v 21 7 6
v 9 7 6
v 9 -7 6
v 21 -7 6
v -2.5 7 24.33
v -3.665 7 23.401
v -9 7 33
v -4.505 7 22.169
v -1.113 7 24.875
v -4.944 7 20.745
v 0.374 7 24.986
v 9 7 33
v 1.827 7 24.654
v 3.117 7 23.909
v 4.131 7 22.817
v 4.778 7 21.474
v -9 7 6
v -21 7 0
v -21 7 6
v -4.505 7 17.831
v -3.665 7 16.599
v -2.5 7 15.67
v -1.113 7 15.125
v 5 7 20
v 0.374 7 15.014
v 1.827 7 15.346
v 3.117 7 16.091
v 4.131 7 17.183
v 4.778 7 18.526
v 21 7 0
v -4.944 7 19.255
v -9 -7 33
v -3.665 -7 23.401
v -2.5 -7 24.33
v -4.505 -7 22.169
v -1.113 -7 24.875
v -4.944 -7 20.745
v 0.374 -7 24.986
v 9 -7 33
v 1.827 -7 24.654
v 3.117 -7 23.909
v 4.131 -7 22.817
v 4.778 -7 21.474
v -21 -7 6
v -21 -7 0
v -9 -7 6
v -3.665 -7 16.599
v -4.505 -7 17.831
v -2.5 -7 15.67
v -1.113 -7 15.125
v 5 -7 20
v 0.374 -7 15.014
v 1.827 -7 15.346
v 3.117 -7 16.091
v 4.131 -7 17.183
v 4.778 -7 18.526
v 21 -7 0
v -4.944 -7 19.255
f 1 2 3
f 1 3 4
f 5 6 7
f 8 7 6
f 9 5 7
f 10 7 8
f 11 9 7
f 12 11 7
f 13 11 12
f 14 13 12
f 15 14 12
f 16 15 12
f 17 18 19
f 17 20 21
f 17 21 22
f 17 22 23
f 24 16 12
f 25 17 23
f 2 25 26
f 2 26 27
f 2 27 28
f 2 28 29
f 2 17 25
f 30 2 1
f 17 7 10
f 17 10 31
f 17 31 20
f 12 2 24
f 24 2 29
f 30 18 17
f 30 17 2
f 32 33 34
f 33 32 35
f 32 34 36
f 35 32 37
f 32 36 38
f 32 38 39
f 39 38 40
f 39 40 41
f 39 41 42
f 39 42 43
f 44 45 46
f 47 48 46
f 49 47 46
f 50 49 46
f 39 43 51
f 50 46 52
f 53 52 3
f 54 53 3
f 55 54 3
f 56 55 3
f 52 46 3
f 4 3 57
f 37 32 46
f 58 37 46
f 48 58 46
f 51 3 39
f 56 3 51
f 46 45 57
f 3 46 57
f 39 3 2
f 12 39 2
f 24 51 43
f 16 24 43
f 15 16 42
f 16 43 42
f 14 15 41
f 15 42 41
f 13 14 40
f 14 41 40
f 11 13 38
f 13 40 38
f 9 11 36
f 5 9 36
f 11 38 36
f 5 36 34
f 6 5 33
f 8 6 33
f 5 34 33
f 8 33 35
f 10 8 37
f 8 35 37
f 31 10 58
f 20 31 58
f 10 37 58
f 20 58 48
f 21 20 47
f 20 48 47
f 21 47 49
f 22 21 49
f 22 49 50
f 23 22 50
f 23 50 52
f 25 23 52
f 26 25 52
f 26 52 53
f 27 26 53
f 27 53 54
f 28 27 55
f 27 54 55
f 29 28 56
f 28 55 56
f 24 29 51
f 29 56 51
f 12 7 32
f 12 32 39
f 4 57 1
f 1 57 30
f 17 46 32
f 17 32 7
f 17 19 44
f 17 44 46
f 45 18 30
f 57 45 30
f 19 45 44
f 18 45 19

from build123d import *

# Parameters (mm, degrees)
F0_W     = 42
F0_H     = 14
F1_DEPTH = 6
F2_W     = 18
F2_H     = 14
F3_DEPTH = 27
F4_R     = 5
F5_DEPTH = 14


with BuildPart() as f1:
    # F0 (on Top) → F1 (new body)
    with BuildSketch(Plane.XY):
        Rectangle(F0_W, F0_H)
    extrude(amount=F1_DEPTH)

    # F2 (on face) → F3 (join)
    with BuildSketch(Plane.XY.offset(6)):
        Rectangle(F2_W, F2_H)
    extrude(amount=F3_DEPTH)

    # F4 (on face) → F5 (cut, through all)
    with BuildSketch(Plane.XZ.offset(7)):
        with Locations((0, 20)):
            Circle(F4_R)
    extrude(amount=-F5_DEPTH, mode=Mode.SUBTRACT)


solid = f1.part
